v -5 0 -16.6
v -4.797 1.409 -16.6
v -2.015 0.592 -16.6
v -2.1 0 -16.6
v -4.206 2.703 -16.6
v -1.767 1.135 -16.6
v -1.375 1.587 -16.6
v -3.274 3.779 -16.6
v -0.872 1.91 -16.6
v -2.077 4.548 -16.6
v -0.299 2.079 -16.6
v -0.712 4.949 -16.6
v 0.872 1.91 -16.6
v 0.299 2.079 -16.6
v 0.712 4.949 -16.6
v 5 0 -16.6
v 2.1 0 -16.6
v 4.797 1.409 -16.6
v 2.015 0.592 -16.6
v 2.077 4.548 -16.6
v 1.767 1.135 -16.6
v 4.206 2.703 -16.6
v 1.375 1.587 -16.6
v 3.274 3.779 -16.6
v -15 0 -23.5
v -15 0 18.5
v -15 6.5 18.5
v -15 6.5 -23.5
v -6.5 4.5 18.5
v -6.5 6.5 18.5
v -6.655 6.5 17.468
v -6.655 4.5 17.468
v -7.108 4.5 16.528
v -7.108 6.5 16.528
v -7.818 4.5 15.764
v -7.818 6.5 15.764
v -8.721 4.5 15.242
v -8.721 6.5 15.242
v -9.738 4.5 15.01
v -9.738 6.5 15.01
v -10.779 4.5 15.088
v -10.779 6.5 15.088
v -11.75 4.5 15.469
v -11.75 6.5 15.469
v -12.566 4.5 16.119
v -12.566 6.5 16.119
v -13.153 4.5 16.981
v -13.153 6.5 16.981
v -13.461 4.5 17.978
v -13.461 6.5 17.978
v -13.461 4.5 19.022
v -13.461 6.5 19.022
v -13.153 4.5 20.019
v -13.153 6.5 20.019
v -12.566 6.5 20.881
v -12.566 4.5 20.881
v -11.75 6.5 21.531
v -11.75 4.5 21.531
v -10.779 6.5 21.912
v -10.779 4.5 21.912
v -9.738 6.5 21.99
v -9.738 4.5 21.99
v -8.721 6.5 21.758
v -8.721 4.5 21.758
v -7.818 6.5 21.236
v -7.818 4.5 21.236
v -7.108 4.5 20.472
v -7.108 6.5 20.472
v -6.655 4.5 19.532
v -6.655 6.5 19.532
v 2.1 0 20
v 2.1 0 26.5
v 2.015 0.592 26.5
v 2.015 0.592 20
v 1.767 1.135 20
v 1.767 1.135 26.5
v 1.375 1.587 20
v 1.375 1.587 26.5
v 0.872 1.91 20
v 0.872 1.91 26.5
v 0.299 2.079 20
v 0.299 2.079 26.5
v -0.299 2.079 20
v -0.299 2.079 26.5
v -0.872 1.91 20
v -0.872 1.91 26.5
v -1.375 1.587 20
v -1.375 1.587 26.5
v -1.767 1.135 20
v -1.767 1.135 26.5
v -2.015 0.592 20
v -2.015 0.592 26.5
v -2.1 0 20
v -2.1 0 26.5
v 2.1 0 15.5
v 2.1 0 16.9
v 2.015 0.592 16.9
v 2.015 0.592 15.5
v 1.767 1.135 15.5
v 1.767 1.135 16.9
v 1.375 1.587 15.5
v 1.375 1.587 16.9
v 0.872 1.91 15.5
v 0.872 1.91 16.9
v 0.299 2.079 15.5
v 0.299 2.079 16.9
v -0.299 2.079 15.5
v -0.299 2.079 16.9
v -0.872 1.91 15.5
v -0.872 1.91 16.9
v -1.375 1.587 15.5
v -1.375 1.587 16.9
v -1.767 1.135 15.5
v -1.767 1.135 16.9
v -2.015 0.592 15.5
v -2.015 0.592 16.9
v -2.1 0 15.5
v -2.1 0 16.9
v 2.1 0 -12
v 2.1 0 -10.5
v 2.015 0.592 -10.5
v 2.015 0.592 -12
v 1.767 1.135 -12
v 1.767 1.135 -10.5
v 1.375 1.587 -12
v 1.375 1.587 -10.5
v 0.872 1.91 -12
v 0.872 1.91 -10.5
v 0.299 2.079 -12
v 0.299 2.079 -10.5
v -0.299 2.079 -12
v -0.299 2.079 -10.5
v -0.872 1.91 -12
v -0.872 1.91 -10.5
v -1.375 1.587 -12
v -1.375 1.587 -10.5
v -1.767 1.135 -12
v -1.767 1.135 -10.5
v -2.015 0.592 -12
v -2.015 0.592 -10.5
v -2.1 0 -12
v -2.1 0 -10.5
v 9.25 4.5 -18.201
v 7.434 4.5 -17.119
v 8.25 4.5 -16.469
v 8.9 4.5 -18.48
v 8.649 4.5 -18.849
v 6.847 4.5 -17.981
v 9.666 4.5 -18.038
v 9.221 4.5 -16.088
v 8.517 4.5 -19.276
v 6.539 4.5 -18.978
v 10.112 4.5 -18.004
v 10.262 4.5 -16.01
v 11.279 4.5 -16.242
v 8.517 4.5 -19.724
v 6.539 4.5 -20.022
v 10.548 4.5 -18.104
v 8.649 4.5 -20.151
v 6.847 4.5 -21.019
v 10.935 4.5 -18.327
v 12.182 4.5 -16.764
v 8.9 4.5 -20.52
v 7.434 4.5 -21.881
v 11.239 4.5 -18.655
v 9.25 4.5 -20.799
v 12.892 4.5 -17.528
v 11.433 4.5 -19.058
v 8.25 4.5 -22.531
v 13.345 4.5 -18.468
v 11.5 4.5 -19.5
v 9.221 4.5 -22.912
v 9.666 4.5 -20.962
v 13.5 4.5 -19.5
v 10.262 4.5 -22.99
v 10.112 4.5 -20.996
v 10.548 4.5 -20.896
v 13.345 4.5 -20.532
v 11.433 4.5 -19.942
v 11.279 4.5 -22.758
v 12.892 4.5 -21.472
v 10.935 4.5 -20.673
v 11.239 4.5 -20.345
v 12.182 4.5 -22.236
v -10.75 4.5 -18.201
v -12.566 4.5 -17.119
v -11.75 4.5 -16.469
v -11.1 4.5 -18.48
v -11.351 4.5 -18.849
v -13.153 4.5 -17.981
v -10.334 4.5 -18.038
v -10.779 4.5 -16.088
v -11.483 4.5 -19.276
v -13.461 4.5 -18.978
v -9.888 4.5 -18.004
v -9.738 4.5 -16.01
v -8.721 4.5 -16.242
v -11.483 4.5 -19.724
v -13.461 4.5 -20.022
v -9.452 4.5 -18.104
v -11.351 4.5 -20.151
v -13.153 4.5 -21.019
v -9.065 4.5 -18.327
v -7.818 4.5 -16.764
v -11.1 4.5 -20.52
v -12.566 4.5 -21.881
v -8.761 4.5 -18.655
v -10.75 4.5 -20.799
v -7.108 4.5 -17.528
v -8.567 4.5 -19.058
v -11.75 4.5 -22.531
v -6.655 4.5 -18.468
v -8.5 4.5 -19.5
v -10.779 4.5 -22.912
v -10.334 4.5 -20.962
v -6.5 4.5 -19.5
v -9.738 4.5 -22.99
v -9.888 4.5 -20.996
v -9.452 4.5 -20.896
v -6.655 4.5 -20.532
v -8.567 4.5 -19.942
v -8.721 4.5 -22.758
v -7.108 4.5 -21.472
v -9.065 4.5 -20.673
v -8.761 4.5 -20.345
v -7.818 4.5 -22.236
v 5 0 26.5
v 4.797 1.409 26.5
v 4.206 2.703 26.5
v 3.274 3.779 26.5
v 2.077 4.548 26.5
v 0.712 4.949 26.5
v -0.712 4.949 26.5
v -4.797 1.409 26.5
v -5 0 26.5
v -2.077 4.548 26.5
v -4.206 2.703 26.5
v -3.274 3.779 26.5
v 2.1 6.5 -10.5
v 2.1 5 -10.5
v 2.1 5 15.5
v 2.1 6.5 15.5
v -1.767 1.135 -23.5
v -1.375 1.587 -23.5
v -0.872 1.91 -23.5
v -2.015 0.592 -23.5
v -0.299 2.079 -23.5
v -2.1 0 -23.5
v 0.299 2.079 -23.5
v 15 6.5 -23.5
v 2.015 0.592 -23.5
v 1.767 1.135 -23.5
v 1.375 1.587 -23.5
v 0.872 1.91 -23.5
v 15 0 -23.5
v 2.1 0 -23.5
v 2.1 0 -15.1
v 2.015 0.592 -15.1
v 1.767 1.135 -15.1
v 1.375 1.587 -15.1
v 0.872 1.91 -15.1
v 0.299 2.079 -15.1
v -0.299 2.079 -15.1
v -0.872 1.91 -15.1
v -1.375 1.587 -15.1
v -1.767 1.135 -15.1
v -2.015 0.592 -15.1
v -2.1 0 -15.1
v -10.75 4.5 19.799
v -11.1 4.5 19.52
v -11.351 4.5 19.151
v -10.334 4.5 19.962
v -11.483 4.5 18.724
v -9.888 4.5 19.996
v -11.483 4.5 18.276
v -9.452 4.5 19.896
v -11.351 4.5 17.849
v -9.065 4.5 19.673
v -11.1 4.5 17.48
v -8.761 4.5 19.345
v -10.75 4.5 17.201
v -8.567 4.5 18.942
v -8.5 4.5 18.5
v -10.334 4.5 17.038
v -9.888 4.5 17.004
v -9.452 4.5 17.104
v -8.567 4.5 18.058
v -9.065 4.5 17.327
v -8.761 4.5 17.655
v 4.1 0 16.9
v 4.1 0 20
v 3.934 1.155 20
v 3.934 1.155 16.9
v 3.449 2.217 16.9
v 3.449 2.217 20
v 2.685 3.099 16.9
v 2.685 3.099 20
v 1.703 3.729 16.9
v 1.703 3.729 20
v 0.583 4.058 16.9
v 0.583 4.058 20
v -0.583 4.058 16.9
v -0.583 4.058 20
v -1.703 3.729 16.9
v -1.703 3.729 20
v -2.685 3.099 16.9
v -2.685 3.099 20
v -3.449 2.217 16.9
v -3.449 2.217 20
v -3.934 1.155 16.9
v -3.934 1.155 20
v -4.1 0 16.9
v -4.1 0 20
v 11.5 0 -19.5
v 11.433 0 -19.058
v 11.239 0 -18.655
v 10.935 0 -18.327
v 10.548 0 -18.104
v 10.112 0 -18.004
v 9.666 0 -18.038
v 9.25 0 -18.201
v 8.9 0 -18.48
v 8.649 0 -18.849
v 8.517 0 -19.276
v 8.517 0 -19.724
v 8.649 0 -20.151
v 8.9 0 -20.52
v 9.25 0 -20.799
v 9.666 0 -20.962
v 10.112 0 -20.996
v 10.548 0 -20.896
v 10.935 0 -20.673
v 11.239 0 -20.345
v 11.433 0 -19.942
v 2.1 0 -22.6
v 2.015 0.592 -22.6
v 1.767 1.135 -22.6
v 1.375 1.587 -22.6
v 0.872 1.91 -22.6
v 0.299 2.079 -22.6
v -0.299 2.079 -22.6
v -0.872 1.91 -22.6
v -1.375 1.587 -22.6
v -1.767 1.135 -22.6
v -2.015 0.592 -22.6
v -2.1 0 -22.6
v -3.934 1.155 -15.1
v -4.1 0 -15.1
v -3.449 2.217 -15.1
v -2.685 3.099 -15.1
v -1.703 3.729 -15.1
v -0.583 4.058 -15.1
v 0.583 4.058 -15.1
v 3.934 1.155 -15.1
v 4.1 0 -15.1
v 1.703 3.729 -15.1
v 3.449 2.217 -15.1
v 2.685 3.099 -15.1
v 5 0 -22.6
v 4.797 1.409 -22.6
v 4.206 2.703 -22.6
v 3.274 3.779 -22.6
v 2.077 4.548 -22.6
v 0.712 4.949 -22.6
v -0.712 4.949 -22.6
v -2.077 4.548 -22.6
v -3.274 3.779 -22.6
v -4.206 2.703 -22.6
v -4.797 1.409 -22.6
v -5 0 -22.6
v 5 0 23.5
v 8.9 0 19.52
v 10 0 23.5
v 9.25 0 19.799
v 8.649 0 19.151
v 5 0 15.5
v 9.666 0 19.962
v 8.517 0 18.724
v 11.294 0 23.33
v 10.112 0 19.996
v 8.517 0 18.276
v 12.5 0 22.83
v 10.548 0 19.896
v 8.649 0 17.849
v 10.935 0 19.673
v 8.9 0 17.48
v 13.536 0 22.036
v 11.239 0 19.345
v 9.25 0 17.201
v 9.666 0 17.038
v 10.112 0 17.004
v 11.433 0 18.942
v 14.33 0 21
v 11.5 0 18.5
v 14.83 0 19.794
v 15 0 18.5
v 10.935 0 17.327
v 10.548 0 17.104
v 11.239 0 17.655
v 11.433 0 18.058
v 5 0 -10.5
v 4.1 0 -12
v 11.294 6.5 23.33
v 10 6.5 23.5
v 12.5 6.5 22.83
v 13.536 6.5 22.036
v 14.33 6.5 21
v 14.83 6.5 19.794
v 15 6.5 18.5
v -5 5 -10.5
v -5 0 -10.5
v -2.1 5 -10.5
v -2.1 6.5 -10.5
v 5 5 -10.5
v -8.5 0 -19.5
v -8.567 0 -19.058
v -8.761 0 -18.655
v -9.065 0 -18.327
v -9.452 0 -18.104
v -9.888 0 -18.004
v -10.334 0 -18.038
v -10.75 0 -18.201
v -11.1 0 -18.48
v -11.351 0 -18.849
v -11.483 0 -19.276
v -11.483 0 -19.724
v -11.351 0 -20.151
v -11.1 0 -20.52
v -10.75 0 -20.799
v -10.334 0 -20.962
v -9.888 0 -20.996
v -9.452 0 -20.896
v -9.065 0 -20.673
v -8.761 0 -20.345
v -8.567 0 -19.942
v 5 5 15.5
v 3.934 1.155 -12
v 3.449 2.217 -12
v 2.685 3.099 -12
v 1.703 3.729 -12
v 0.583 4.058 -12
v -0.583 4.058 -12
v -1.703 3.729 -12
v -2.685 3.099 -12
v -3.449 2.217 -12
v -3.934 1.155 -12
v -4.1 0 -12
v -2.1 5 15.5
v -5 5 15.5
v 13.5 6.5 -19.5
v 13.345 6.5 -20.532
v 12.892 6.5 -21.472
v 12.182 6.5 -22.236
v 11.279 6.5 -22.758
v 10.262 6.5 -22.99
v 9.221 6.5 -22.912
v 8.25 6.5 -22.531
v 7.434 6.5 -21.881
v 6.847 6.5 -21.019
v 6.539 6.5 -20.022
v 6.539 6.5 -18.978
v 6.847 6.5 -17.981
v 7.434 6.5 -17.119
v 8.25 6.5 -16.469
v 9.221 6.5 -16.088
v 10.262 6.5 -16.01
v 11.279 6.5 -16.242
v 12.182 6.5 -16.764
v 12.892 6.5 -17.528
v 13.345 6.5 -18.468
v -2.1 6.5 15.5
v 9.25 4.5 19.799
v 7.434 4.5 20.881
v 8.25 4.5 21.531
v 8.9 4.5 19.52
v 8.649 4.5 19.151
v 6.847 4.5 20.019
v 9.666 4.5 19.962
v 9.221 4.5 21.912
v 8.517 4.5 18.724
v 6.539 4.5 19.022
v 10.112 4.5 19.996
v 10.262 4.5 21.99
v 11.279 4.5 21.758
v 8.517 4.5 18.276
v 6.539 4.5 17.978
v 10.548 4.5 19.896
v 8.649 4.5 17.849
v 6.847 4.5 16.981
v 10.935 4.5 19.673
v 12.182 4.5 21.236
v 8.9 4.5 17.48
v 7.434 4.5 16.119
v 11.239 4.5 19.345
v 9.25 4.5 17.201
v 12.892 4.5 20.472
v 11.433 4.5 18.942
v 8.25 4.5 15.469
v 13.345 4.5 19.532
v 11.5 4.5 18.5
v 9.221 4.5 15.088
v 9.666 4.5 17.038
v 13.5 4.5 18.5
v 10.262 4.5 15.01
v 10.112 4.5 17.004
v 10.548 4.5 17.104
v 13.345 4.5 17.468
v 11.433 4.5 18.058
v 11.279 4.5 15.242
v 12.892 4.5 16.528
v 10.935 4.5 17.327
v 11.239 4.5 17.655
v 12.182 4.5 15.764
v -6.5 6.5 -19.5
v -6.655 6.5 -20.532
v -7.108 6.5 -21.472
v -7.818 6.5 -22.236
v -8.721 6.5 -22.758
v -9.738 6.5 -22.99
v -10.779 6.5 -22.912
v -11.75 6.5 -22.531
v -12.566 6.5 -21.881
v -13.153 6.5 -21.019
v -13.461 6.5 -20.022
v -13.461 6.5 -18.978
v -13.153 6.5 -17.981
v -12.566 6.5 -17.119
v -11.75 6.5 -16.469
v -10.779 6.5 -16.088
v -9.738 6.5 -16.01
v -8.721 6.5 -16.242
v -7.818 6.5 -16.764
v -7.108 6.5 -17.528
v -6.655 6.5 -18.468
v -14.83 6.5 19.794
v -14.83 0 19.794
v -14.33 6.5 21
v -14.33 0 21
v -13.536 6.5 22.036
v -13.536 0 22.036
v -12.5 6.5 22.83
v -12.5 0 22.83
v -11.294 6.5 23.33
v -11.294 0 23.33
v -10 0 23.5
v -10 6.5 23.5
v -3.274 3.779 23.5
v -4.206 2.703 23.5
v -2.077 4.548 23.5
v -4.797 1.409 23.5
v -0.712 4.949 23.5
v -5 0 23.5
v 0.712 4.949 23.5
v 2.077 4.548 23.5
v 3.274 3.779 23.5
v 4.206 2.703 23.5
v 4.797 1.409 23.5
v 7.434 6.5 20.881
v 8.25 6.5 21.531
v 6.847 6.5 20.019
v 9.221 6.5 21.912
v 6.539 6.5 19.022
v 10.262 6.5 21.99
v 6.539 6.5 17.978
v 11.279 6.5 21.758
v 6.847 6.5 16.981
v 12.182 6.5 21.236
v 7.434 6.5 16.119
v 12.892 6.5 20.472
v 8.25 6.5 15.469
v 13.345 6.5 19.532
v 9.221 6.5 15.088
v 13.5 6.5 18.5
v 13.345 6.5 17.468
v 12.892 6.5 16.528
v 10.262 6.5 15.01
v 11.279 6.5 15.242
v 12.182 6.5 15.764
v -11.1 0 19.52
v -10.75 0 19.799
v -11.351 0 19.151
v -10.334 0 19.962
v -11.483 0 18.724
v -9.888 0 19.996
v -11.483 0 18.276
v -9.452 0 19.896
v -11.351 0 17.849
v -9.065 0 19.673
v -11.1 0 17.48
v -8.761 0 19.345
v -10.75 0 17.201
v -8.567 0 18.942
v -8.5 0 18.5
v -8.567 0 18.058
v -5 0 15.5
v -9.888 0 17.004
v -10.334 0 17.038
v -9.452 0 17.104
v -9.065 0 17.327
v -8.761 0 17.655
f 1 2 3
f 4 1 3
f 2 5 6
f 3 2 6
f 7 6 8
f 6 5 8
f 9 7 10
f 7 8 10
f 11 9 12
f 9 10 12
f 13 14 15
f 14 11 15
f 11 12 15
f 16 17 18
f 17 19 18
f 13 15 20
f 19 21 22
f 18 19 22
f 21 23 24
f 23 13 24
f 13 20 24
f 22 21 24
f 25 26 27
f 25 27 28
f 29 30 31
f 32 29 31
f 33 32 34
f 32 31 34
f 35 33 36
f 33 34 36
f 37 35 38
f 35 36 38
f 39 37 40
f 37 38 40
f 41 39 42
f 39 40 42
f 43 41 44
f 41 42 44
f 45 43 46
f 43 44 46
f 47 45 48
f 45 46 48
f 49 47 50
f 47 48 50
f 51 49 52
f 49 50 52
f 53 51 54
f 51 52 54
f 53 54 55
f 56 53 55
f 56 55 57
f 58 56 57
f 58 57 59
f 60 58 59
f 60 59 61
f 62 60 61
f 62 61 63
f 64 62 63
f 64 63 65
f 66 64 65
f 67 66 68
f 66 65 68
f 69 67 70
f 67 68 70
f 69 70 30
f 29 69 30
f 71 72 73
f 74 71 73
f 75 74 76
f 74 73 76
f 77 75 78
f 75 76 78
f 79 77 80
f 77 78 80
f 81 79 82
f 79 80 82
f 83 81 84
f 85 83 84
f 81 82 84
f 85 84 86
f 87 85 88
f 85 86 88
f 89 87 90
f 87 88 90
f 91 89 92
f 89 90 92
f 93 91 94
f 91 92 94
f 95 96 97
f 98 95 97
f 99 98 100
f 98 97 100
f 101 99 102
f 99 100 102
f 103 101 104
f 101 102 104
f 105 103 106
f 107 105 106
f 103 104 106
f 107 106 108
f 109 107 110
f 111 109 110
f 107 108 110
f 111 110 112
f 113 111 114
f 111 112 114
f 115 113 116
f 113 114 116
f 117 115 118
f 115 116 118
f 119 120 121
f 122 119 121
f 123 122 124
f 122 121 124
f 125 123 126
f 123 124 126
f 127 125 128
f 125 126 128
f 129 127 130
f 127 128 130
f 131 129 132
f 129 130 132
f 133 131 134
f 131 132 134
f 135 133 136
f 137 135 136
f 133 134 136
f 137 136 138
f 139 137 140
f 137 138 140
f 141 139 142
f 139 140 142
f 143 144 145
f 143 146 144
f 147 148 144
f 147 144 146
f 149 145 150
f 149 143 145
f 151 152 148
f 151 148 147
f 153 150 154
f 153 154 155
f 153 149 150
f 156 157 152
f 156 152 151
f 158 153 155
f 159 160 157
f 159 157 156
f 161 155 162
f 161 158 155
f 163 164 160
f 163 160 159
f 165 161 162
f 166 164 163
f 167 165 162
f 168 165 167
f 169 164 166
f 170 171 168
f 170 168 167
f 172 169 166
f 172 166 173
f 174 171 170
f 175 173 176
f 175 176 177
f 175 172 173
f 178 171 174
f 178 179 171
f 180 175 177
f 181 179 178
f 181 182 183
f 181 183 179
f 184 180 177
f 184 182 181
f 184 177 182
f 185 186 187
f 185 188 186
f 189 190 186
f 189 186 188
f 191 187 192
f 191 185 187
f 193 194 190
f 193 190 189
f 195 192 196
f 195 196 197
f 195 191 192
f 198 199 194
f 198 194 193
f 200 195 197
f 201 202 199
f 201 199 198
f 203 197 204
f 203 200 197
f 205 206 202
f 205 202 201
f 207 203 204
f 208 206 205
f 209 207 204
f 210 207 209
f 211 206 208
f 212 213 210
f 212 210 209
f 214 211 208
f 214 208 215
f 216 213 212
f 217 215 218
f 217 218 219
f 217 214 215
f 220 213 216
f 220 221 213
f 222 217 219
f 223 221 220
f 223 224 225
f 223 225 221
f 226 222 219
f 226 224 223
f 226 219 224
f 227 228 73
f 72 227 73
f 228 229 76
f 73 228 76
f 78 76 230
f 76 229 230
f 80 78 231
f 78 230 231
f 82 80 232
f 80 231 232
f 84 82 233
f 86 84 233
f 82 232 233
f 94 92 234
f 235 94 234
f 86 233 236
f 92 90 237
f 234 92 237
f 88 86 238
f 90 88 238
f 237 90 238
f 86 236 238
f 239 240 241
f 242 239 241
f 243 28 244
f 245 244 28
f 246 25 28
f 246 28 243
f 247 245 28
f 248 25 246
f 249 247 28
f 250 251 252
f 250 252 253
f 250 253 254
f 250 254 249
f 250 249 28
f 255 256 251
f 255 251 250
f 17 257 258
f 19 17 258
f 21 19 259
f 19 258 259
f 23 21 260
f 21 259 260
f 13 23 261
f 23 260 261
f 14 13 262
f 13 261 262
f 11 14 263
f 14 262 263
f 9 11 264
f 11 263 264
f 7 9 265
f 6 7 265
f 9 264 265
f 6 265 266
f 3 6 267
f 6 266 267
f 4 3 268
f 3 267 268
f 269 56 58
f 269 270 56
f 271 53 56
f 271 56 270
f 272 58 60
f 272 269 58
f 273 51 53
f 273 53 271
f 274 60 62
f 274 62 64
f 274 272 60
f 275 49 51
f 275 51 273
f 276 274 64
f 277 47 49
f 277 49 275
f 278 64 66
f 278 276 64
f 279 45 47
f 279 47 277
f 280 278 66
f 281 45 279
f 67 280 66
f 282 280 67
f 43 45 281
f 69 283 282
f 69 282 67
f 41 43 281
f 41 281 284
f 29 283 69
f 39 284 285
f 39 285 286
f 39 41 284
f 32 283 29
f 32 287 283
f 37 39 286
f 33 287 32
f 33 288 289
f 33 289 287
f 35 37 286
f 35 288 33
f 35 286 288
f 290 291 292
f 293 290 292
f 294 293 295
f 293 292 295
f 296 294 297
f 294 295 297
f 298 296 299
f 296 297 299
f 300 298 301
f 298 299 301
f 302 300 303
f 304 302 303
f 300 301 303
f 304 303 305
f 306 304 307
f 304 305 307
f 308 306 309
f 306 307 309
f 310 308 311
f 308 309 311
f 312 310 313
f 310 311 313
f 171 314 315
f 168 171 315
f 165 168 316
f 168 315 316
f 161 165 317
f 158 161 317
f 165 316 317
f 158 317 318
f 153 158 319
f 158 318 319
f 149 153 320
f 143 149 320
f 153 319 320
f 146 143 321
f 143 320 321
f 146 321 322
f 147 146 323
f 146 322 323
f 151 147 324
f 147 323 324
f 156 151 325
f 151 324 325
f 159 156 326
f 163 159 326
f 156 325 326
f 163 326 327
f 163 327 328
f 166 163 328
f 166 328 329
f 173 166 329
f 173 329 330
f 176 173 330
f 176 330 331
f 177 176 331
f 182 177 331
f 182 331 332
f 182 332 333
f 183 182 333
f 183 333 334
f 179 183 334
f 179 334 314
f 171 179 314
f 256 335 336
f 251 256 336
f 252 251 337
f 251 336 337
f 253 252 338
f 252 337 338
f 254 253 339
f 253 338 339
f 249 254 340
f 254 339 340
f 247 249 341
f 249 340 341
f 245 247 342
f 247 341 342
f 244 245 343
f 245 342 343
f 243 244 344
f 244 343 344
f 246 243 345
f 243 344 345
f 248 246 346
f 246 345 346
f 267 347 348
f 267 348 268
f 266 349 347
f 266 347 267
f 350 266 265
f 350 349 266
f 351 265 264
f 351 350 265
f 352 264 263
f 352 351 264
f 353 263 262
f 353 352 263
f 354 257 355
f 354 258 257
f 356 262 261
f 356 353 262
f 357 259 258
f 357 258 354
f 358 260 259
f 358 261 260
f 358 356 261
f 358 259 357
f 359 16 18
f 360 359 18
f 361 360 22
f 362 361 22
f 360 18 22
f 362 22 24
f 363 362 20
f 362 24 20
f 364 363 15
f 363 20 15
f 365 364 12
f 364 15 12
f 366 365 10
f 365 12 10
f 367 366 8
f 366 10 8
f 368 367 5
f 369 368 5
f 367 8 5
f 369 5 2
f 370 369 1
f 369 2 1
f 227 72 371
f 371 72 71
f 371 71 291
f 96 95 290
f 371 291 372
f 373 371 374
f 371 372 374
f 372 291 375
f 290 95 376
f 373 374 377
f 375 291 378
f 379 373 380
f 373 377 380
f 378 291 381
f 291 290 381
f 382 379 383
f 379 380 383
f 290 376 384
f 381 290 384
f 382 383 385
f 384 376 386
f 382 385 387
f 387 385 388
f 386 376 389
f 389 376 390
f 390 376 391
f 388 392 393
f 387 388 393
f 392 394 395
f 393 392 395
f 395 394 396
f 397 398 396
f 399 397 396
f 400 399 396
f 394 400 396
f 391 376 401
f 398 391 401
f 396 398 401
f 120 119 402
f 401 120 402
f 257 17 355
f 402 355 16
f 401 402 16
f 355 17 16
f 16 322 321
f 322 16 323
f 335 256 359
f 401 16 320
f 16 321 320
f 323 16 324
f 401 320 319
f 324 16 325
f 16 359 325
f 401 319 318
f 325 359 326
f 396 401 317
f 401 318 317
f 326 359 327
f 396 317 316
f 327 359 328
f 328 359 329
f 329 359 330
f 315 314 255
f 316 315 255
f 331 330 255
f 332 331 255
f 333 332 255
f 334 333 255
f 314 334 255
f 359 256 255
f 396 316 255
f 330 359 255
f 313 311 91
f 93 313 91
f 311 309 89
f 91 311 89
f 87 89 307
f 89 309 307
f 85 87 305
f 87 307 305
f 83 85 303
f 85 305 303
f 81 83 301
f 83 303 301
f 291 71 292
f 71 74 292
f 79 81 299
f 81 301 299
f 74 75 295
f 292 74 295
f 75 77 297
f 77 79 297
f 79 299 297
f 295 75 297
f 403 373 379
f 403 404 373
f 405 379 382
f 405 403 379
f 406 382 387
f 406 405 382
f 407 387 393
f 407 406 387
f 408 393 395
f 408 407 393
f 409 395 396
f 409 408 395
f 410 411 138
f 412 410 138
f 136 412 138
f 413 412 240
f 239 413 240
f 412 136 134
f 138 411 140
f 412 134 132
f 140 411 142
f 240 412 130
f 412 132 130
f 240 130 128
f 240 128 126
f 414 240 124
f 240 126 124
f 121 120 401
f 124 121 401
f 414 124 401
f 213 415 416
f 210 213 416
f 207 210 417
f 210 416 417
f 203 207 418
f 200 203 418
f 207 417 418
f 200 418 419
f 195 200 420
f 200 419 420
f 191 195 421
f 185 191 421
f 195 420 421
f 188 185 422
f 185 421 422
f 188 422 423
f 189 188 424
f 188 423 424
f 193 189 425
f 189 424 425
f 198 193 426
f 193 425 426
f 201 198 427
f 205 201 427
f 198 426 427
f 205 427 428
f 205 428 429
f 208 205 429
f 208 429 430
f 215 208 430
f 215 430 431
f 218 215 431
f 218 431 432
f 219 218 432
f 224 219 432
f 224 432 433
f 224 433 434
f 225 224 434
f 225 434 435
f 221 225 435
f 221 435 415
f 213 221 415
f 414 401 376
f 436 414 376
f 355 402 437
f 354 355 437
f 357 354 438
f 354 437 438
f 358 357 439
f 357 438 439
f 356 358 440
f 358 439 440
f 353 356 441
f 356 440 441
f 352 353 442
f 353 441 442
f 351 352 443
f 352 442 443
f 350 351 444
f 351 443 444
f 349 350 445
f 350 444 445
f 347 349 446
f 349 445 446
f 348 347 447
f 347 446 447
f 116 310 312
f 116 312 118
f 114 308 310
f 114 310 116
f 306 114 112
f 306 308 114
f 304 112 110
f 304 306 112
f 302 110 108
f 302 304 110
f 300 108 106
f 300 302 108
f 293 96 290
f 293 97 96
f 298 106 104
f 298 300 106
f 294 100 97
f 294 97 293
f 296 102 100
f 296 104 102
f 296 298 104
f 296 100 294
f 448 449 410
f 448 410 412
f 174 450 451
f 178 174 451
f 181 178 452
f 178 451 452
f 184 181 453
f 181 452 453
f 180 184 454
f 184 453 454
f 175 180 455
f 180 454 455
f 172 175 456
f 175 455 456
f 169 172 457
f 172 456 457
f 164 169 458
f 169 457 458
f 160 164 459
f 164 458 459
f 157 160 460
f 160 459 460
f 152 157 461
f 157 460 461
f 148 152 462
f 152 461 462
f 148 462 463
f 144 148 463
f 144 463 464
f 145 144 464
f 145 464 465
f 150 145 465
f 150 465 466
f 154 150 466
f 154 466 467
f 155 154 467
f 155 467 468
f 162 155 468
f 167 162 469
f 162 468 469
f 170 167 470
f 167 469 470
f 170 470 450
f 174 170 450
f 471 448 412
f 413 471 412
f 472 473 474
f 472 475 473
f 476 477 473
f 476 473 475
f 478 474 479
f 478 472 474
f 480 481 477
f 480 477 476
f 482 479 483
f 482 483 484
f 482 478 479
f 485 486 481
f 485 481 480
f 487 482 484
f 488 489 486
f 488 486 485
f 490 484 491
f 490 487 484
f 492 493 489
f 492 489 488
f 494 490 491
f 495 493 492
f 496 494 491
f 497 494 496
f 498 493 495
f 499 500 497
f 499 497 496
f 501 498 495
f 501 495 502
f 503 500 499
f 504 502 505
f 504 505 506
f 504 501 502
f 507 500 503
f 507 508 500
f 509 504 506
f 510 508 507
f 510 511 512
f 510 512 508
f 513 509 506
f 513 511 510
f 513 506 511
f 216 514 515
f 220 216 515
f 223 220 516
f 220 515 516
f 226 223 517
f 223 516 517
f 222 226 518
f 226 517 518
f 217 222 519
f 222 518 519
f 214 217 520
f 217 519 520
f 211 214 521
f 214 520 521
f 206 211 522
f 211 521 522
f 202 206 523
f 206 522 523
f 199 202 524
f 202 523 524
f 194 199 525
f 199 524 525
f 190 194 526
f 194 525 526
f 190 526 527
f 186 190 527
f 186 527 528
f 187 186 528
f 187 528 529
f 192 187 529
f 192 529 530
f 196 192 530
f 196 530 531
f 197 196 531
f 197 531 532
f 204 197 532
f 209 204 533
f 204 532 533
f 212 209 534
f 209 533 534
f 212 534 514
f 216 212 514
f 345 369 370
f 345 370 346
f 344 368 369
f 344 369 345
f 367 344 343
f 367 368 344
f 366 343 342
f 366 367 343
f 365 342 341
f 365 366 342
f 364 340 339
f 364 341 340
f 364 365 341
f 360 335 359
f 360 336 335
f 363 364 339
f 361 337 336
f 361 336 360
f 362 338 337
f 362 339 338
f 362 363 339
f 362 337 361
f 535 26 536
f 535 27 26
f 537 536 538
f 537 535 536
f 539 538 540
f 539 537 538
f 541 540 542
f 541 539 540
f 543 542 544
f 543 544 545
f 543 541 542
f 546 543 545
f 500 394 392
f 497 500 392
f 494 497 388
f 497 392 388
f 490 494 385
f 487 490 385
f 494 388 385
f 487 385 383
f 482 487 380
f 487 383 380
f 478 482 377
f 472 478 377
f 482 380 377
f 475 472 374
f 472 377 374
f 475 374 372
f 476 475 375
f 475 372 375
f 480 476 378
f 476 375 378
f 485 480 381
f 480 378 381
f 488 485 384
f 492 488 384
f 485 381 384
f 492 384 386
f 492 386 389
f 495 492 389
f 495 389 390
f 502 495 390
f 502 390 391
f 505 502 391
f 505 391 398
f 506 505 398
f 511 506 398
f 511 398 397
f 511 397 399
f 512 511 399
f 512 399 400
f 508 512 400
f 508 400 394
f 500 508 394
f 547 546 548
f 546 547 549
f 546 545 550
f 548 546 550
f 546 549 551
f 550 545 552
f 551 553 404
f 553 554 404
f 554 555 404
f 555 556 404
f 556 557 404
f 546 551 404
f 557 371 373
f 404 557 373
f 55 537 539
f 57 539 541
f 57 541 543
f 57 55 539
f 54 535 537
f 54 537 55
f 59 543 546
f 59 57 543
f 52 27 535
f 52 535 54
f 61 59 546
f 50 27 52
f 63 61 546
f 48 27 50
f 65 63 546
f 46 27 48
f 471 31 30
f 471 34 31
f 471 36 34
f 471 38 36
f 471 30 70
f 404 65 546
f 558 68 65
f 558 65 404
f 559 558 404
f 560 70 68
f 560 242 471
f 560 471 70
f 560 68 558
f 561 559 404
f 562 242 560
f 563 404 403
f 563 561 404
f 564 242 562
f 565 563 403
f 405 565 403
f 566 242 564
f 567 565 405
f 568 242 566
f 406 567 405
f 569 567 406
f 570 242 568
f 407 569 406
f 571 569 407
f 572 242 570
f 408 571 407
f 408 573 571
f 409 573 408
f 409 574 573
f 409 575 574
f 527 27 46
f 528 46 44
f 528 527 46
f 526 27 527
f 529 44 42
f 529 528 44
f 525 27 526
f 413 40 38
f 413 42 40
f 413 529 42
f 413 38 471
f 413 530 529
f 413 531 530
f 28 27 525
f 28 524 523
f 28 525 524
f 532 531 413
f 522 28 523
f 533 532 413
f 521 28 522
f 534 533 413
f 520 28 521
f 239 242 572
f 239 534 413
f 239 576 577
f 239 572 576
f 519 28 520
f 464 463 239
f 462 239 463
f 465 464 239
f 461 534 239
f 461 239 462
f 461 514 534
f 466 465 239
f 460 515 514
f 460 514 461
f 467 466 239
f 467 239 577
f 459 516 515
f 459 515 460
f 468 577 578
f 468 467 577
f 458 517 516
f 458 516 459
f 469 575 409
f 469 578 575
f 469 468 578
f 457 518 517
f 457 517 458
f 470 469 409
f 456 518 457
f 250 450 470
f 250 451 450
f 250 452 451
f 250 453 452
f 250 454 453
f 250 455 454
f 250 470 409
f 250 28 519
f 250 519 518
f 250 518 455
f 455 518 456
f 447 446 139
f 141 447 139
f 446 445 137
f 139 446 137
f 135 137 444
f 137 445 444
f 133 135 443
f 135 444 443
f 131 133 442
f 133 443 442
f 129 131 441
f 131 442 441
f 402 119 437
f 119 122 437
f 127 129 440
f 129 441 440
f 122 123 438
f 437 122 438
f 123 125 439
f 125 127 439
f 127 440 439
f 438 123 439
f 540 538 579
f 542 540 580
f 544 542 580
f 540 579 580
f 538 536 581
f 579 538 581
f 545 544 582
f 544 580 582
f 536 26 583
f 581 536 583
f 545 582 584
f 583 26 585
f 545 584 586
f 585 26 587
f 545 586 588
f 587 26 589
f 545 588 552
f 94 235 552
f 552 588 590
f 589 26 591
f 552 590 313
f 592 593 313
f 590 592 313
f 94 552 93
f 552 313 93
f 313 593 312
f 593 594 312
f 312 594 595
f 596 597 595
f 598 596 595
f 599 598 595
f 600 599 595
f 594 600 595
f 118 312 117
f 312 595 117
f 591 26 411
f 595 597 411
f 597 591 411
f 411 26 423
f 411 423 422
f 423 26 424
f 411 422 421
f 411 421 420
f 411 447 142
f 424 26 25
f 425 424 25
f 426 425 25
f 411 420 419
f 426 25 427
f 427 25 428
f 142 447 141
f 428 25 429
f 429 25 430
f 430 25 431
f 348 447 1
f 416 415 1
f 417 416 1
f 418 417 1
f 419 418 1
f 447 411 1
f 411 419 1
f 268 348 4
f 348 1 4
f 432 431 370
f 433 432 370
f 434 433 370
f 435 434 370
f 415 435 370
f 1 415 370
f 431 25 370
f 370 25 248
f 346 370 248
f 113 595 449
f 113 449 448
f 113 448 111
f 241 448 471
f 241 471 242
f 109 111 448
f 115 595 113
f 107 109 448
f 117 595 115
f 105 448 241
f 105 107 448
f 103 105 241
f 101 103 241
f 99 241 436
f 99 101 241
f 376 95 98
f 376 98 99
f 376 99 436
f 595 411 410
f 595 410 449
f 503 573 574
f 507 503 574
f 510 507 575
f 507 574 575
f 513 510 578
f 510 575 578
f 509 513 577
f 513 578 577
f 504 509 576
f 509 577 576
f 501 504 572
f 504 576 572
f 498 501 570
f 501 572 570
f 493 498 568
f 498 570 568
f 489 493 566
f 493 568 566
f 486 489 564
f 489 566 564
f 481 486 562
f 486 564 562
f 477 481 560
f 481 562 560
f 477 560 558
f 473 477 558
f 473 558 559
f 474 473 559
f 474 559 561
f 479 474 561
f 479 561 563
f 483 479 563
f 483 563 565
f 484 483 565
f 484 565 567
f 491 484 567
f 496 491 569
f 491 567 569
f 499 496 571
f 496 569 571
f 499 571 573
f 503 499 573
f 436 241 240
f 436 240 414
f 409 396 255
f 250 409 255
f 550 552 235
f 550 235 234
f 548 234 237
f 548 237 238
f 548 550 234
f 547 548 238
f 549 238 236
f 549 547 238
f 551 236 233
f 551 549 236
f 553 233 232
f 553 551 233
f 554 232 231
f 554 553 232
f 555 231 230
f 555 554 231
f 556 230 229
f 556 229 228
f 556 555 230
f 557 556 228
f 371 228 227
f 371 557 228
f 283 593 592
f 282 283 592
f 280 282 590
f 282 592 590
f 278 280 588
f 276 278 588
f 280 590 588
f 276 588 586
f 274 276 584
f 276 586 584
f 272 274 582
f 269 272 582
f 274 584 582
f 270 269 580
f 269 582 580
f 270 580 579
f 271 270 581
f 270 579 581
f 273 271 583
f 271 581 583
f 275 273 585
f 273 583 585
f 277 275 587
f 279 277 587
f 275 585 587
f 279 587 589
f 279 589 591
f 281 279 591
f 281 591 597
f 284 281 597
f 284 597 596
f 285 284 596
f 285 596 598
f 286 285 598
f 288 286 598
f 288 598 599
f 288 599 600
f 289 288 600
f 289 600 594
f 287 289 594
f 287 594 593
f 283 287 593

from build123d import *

# Parameters (mm, degrees)
SKETCH1_W           = 30
SKETCH1_H           = 47
BOSS_EXTRUDE1_DEPTH = 6.5
BOSS_EXTRUDE2_DEPTH = 3
SKETCH3_R           = 2.1
CUT_EXTRUDE1_DEPTH  = 50
FILLET1_R           = 5
SKETCH4_R           = 4.1
CUT_EXTRUDE2_DEPTH  = 3.1
SKETCH5_W           = 10
SKETCH5_H           = 26
CUT_EXTRUDE3_DEPTH  = 5
SKETCH9_R           = 4.1
CUT_EXTRUDE4_DEPTH  = 3.1
SKETCH10_R          = 5
CUT_EXTRUDE5_DEPTH  = 6
SKETCH11_R          = 1.5
CUT_EXTRUDE6_DEPTH  = 7.5
SKETCH12_R          = 3.5
CUT_EXTRUDE7_DEPTH  = 2
CUT_EXTRUDE8_DEPTH  = 2.5


with BuildPart() as part:
    # Sketch1 → Boss-Extrude1 (new body)
    with BuildSketch(Plane(origin=(0, 0, 0), x_dir=(1, 0, 0), z_dir=(0, 1, 0))):
        Rectangle(SKETCH1_W, SKETCH1_H)
    extrude(amount=BOSS_EXTRUDE1_DEPTH)

    # Sketch2 → Boss-Extrude2 (add)
    with BuildSketch(Plane.XY.offset(23.5)):
        with BuildLine():
            Line((5, 0), (-5, 0))
            ThreePointArc((-5, 0), (0, 5), (5, 0))
        make_face()
    extrude(amount=BOSS_EXTRUDE2_DEPTH)

    # Sketch3 → Cut-Extrude1 (cut)
    with BuildSketch(Plane.XY.offset(26.5)):
        Circle(SKETCH3_R)
    extrude(amount=-CUT_EXTRUDE1_DEPTH, mode=Mode.SUBTRACT)

    # Fillet1
    fillet1_edges = [part.edges().sort_by_distance(p)[0] for p in [
        (15, 3.25, 23.5),
        (-15, 3.25, 23.5),
    ]]
    fillet(fillet1_edges, radius=FILLET1_R)

    # Sketch4 → Cut-Extrude2 (cut)
    with BuildSketch(Plane.XY.offset(20)):
        Circle(SKETCH4_R)
    extrude(amount=-CUT_EXTRUDE2_DEPTH, mode=Mode.SUBTRACT)

    # Sketch5 → Cut-Extrude3 (cut)
    with BuildSketch(Plane.XZ):
        with Locations((0, 2.5)):
            Rectangle(SKETCH5_W, SKETCH5_H)
    extrude(amount=-CUT_EXTRUDE3_DEPTH, mode=Mode.SUBTRACT)

    # Sketch9 → Cut-Extrude4 (cut)
    with BuildSketch(Plane.XY.offset(-12)):
        Circle(SKETCH9_R)
    extrude(amount=-CUT_EXTRUDE4_DEPTH, mode=Mode.SUBTRACT)

    # Sketch10 → Cut-Extrude5 (cut)
    with BuildSketch(Plane.XY.offset(-16.6)):
        Circle(SKETCH10_R)
    extrude(amount=-CUT_EXTRUDE5_DEPTH, mode=Mode.SUBTRACT)

    # Sketch11 → Cut-Extrude6 (cut, through all)
    with BuildSketch(Plane.XZ):
        with Locations((10, 18.5)):
            Circle(SKETCH11_R)
        with Locations((10, -19.5)):
            Circle(SKETCH11_R)
        with Locations((-10, -19.5)):
            Circle(SKETCH11_R)
        with Locations((-10, 18.5)):
            Circle(SKETCH11_R)
    extrude(amount=-CUT_EXTRUDE6_DEPTH, mode=Mode.SUBTRACT)

    # Sketch12 → Cut-Extrude7 (cut)
    with BuildSketch(Plane(origin=(0, 6.5, 0), x_dir=(1, 0, 0), z_dir=(0, 1, 0))):
        with Locations((-10, 19.5)):
            Circle(SKETCH12_R)
        with Locations((10, 19.5)):
            Circle(SKETCH12_R)
        with Locations((10, -18.5)):
            Circle(SKETCH12_R)
        with Locations((-10, -18.5)):
            Circle(SKETCH12_R)
    extrude(amount=-CUT_EXTRUDE7_DEPTH, mode=Mode.SUBTRACT)

    # Sketch13 → Cut-Extrude8 (cut, through all)
    with BuildSketch(Plane.XZ.offset(-5)):
        Polygon((0, -10.5), (2.1, -10.5), (2.1, 15.5), (-2.1, 15.5), (-2.1, -10.5), align=None)
    extrude(amount=-CUT_EXTRUDE8_DEPTH, mode=Mode.SUBTRACT)


solid = part.part
